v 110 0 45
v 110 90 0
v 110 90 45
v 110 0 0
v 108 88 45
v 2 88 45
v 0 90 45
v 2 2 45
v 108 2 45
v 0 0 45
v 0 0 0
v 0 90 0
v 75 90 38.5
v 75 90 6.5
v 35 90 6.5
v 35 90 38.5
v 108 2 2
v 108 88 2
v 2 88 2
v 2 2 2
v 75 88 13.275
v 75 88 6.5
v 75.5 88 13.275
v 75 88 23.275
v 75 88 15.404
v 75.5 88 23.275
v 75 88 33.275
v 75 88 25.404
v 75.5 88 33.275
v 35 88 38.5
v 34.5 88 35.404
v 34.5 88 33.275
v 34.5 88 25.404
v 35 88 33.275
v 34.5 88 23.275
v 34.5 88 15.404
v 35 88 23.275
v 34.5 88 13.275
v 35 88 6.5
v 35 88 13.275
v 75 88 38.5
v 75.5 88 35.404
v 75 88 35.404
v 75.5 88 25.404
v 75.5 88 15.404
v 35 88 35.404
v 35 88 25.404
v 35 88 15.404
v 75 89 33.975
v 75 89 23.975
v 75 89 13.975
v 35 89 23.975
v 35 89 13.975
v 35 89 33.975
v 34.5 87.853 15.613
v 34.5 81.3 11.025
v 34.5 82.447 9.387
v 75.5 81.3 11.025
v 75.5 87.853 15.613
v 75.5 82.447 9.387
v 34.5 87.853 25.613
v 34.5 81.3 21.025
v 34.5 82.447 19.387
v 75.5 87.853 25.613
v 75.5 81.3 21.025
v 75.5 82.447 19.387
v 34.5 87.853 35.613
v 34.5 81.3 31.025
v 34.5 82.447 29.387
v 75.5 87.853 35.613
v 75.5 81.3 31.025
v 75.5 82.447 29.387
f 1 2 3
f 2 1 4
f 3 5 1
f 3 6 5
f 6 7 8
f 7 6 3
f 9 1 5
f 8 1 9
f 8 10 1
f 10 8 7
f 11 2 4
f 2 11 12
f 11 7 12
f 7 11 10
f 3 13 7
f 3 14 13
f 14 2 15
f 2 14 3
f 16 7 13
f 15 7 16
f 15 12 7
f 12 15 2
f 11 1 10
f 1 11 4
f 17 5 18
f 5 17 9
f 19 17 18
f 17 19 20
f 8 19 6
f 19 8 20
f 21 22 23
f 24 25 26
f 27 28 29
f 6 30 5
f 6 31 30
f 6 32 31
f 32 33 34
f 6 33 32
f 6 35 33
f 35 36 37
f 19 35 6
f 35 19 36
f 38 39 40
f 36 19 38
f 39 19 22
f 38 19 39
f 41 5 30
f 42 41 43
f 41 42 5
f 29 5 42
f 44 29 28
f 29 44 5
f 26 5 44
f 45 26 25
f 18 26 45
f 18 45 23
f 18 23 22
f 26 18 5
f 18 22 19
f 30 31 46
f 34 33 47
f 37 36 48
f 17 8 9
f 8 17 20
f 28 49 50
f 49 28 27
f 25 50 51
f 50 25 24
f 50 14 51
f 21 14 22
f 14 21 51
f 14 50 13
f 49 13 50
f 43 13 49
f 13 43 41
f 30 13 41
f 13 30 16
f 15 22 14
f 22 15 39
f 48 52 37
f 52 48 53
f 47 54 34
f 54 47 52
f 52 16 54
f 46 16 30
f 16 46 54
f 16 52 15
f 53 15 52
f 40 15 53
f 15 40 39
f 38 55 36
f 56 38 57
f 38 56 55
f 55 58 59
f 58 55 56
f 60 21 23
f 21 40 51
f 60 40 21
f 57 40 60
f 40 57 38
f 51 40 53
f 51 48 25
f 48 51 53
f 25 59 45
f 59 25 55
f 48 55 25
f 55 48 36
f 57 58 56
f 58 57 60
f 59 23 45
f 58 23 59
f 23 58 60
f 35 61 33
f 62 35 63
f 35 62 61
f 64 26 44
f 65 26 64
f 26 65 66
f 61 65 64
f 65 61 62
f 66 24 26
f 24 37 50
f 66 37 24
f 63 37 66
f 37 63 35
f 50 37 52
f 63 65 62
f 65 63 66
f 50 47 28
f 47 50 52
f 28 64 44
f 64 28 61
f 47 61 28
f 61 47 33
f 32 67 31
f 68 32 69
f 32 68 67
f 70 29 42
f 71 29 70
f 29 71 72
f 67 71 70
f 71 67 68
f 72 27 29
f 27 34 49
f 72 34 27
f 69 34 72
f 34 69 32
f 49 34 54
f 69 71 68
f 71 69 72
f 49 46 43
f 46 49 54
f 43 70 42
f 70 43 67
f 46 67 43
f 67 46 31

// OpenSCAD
$fn = 32;

// ----------------------------------------------------------------------
// Vent box: louvers enclosure
// ----------------------------------------------------------------------

// --- parameters (mm) ---
box_l = 110;              // box length, X
box_w = 90;               // box width, Y
box_h = 45;               // box height, Z
wall_t = 2;               // shell wall thickness
win_l = 40;               // vent window width, X
win_h = 32;               // vent window height, Z
slat_t = 2;               // louver slat thickness
slat_d = 8;               // louver slat depth
slat_a = 35;              // louver slat angle, degrees
slat_pitch = 10;          // louver pitch
slat_yc = 85.15;          // slat centreline Y

win_z0 = (box_h - win_h) / 2;  // window lower edge Z
n_slats = 3;  // louver count
slat_z0 = win_z0 + (win_h - (n_slats - 1) * slat_pitch) / 2;

difference() {
  union() {
    difference() {
      cube([box_l, box_w, box_h]);
  translate([wall_t, wall_t, wall_t])
    cube([box_l - 2 * wall_t, box_w - 2 * wall_t, box_h]);
  translate([(box_l - win_l) / 2, box_w - wall_t - 1, win_z0])
    cube([win_l, wall_t + 2, win_h]);
    }
    for (i = [0 : n_slats - 1])
      translate([box_l / 2, slat_yc, slat_z0 + i * slat_pitch])
        rotate([slat_a, 0, 0])
          cube([win_l + 1, slat_d, slat_t], center = true);
  }
}
